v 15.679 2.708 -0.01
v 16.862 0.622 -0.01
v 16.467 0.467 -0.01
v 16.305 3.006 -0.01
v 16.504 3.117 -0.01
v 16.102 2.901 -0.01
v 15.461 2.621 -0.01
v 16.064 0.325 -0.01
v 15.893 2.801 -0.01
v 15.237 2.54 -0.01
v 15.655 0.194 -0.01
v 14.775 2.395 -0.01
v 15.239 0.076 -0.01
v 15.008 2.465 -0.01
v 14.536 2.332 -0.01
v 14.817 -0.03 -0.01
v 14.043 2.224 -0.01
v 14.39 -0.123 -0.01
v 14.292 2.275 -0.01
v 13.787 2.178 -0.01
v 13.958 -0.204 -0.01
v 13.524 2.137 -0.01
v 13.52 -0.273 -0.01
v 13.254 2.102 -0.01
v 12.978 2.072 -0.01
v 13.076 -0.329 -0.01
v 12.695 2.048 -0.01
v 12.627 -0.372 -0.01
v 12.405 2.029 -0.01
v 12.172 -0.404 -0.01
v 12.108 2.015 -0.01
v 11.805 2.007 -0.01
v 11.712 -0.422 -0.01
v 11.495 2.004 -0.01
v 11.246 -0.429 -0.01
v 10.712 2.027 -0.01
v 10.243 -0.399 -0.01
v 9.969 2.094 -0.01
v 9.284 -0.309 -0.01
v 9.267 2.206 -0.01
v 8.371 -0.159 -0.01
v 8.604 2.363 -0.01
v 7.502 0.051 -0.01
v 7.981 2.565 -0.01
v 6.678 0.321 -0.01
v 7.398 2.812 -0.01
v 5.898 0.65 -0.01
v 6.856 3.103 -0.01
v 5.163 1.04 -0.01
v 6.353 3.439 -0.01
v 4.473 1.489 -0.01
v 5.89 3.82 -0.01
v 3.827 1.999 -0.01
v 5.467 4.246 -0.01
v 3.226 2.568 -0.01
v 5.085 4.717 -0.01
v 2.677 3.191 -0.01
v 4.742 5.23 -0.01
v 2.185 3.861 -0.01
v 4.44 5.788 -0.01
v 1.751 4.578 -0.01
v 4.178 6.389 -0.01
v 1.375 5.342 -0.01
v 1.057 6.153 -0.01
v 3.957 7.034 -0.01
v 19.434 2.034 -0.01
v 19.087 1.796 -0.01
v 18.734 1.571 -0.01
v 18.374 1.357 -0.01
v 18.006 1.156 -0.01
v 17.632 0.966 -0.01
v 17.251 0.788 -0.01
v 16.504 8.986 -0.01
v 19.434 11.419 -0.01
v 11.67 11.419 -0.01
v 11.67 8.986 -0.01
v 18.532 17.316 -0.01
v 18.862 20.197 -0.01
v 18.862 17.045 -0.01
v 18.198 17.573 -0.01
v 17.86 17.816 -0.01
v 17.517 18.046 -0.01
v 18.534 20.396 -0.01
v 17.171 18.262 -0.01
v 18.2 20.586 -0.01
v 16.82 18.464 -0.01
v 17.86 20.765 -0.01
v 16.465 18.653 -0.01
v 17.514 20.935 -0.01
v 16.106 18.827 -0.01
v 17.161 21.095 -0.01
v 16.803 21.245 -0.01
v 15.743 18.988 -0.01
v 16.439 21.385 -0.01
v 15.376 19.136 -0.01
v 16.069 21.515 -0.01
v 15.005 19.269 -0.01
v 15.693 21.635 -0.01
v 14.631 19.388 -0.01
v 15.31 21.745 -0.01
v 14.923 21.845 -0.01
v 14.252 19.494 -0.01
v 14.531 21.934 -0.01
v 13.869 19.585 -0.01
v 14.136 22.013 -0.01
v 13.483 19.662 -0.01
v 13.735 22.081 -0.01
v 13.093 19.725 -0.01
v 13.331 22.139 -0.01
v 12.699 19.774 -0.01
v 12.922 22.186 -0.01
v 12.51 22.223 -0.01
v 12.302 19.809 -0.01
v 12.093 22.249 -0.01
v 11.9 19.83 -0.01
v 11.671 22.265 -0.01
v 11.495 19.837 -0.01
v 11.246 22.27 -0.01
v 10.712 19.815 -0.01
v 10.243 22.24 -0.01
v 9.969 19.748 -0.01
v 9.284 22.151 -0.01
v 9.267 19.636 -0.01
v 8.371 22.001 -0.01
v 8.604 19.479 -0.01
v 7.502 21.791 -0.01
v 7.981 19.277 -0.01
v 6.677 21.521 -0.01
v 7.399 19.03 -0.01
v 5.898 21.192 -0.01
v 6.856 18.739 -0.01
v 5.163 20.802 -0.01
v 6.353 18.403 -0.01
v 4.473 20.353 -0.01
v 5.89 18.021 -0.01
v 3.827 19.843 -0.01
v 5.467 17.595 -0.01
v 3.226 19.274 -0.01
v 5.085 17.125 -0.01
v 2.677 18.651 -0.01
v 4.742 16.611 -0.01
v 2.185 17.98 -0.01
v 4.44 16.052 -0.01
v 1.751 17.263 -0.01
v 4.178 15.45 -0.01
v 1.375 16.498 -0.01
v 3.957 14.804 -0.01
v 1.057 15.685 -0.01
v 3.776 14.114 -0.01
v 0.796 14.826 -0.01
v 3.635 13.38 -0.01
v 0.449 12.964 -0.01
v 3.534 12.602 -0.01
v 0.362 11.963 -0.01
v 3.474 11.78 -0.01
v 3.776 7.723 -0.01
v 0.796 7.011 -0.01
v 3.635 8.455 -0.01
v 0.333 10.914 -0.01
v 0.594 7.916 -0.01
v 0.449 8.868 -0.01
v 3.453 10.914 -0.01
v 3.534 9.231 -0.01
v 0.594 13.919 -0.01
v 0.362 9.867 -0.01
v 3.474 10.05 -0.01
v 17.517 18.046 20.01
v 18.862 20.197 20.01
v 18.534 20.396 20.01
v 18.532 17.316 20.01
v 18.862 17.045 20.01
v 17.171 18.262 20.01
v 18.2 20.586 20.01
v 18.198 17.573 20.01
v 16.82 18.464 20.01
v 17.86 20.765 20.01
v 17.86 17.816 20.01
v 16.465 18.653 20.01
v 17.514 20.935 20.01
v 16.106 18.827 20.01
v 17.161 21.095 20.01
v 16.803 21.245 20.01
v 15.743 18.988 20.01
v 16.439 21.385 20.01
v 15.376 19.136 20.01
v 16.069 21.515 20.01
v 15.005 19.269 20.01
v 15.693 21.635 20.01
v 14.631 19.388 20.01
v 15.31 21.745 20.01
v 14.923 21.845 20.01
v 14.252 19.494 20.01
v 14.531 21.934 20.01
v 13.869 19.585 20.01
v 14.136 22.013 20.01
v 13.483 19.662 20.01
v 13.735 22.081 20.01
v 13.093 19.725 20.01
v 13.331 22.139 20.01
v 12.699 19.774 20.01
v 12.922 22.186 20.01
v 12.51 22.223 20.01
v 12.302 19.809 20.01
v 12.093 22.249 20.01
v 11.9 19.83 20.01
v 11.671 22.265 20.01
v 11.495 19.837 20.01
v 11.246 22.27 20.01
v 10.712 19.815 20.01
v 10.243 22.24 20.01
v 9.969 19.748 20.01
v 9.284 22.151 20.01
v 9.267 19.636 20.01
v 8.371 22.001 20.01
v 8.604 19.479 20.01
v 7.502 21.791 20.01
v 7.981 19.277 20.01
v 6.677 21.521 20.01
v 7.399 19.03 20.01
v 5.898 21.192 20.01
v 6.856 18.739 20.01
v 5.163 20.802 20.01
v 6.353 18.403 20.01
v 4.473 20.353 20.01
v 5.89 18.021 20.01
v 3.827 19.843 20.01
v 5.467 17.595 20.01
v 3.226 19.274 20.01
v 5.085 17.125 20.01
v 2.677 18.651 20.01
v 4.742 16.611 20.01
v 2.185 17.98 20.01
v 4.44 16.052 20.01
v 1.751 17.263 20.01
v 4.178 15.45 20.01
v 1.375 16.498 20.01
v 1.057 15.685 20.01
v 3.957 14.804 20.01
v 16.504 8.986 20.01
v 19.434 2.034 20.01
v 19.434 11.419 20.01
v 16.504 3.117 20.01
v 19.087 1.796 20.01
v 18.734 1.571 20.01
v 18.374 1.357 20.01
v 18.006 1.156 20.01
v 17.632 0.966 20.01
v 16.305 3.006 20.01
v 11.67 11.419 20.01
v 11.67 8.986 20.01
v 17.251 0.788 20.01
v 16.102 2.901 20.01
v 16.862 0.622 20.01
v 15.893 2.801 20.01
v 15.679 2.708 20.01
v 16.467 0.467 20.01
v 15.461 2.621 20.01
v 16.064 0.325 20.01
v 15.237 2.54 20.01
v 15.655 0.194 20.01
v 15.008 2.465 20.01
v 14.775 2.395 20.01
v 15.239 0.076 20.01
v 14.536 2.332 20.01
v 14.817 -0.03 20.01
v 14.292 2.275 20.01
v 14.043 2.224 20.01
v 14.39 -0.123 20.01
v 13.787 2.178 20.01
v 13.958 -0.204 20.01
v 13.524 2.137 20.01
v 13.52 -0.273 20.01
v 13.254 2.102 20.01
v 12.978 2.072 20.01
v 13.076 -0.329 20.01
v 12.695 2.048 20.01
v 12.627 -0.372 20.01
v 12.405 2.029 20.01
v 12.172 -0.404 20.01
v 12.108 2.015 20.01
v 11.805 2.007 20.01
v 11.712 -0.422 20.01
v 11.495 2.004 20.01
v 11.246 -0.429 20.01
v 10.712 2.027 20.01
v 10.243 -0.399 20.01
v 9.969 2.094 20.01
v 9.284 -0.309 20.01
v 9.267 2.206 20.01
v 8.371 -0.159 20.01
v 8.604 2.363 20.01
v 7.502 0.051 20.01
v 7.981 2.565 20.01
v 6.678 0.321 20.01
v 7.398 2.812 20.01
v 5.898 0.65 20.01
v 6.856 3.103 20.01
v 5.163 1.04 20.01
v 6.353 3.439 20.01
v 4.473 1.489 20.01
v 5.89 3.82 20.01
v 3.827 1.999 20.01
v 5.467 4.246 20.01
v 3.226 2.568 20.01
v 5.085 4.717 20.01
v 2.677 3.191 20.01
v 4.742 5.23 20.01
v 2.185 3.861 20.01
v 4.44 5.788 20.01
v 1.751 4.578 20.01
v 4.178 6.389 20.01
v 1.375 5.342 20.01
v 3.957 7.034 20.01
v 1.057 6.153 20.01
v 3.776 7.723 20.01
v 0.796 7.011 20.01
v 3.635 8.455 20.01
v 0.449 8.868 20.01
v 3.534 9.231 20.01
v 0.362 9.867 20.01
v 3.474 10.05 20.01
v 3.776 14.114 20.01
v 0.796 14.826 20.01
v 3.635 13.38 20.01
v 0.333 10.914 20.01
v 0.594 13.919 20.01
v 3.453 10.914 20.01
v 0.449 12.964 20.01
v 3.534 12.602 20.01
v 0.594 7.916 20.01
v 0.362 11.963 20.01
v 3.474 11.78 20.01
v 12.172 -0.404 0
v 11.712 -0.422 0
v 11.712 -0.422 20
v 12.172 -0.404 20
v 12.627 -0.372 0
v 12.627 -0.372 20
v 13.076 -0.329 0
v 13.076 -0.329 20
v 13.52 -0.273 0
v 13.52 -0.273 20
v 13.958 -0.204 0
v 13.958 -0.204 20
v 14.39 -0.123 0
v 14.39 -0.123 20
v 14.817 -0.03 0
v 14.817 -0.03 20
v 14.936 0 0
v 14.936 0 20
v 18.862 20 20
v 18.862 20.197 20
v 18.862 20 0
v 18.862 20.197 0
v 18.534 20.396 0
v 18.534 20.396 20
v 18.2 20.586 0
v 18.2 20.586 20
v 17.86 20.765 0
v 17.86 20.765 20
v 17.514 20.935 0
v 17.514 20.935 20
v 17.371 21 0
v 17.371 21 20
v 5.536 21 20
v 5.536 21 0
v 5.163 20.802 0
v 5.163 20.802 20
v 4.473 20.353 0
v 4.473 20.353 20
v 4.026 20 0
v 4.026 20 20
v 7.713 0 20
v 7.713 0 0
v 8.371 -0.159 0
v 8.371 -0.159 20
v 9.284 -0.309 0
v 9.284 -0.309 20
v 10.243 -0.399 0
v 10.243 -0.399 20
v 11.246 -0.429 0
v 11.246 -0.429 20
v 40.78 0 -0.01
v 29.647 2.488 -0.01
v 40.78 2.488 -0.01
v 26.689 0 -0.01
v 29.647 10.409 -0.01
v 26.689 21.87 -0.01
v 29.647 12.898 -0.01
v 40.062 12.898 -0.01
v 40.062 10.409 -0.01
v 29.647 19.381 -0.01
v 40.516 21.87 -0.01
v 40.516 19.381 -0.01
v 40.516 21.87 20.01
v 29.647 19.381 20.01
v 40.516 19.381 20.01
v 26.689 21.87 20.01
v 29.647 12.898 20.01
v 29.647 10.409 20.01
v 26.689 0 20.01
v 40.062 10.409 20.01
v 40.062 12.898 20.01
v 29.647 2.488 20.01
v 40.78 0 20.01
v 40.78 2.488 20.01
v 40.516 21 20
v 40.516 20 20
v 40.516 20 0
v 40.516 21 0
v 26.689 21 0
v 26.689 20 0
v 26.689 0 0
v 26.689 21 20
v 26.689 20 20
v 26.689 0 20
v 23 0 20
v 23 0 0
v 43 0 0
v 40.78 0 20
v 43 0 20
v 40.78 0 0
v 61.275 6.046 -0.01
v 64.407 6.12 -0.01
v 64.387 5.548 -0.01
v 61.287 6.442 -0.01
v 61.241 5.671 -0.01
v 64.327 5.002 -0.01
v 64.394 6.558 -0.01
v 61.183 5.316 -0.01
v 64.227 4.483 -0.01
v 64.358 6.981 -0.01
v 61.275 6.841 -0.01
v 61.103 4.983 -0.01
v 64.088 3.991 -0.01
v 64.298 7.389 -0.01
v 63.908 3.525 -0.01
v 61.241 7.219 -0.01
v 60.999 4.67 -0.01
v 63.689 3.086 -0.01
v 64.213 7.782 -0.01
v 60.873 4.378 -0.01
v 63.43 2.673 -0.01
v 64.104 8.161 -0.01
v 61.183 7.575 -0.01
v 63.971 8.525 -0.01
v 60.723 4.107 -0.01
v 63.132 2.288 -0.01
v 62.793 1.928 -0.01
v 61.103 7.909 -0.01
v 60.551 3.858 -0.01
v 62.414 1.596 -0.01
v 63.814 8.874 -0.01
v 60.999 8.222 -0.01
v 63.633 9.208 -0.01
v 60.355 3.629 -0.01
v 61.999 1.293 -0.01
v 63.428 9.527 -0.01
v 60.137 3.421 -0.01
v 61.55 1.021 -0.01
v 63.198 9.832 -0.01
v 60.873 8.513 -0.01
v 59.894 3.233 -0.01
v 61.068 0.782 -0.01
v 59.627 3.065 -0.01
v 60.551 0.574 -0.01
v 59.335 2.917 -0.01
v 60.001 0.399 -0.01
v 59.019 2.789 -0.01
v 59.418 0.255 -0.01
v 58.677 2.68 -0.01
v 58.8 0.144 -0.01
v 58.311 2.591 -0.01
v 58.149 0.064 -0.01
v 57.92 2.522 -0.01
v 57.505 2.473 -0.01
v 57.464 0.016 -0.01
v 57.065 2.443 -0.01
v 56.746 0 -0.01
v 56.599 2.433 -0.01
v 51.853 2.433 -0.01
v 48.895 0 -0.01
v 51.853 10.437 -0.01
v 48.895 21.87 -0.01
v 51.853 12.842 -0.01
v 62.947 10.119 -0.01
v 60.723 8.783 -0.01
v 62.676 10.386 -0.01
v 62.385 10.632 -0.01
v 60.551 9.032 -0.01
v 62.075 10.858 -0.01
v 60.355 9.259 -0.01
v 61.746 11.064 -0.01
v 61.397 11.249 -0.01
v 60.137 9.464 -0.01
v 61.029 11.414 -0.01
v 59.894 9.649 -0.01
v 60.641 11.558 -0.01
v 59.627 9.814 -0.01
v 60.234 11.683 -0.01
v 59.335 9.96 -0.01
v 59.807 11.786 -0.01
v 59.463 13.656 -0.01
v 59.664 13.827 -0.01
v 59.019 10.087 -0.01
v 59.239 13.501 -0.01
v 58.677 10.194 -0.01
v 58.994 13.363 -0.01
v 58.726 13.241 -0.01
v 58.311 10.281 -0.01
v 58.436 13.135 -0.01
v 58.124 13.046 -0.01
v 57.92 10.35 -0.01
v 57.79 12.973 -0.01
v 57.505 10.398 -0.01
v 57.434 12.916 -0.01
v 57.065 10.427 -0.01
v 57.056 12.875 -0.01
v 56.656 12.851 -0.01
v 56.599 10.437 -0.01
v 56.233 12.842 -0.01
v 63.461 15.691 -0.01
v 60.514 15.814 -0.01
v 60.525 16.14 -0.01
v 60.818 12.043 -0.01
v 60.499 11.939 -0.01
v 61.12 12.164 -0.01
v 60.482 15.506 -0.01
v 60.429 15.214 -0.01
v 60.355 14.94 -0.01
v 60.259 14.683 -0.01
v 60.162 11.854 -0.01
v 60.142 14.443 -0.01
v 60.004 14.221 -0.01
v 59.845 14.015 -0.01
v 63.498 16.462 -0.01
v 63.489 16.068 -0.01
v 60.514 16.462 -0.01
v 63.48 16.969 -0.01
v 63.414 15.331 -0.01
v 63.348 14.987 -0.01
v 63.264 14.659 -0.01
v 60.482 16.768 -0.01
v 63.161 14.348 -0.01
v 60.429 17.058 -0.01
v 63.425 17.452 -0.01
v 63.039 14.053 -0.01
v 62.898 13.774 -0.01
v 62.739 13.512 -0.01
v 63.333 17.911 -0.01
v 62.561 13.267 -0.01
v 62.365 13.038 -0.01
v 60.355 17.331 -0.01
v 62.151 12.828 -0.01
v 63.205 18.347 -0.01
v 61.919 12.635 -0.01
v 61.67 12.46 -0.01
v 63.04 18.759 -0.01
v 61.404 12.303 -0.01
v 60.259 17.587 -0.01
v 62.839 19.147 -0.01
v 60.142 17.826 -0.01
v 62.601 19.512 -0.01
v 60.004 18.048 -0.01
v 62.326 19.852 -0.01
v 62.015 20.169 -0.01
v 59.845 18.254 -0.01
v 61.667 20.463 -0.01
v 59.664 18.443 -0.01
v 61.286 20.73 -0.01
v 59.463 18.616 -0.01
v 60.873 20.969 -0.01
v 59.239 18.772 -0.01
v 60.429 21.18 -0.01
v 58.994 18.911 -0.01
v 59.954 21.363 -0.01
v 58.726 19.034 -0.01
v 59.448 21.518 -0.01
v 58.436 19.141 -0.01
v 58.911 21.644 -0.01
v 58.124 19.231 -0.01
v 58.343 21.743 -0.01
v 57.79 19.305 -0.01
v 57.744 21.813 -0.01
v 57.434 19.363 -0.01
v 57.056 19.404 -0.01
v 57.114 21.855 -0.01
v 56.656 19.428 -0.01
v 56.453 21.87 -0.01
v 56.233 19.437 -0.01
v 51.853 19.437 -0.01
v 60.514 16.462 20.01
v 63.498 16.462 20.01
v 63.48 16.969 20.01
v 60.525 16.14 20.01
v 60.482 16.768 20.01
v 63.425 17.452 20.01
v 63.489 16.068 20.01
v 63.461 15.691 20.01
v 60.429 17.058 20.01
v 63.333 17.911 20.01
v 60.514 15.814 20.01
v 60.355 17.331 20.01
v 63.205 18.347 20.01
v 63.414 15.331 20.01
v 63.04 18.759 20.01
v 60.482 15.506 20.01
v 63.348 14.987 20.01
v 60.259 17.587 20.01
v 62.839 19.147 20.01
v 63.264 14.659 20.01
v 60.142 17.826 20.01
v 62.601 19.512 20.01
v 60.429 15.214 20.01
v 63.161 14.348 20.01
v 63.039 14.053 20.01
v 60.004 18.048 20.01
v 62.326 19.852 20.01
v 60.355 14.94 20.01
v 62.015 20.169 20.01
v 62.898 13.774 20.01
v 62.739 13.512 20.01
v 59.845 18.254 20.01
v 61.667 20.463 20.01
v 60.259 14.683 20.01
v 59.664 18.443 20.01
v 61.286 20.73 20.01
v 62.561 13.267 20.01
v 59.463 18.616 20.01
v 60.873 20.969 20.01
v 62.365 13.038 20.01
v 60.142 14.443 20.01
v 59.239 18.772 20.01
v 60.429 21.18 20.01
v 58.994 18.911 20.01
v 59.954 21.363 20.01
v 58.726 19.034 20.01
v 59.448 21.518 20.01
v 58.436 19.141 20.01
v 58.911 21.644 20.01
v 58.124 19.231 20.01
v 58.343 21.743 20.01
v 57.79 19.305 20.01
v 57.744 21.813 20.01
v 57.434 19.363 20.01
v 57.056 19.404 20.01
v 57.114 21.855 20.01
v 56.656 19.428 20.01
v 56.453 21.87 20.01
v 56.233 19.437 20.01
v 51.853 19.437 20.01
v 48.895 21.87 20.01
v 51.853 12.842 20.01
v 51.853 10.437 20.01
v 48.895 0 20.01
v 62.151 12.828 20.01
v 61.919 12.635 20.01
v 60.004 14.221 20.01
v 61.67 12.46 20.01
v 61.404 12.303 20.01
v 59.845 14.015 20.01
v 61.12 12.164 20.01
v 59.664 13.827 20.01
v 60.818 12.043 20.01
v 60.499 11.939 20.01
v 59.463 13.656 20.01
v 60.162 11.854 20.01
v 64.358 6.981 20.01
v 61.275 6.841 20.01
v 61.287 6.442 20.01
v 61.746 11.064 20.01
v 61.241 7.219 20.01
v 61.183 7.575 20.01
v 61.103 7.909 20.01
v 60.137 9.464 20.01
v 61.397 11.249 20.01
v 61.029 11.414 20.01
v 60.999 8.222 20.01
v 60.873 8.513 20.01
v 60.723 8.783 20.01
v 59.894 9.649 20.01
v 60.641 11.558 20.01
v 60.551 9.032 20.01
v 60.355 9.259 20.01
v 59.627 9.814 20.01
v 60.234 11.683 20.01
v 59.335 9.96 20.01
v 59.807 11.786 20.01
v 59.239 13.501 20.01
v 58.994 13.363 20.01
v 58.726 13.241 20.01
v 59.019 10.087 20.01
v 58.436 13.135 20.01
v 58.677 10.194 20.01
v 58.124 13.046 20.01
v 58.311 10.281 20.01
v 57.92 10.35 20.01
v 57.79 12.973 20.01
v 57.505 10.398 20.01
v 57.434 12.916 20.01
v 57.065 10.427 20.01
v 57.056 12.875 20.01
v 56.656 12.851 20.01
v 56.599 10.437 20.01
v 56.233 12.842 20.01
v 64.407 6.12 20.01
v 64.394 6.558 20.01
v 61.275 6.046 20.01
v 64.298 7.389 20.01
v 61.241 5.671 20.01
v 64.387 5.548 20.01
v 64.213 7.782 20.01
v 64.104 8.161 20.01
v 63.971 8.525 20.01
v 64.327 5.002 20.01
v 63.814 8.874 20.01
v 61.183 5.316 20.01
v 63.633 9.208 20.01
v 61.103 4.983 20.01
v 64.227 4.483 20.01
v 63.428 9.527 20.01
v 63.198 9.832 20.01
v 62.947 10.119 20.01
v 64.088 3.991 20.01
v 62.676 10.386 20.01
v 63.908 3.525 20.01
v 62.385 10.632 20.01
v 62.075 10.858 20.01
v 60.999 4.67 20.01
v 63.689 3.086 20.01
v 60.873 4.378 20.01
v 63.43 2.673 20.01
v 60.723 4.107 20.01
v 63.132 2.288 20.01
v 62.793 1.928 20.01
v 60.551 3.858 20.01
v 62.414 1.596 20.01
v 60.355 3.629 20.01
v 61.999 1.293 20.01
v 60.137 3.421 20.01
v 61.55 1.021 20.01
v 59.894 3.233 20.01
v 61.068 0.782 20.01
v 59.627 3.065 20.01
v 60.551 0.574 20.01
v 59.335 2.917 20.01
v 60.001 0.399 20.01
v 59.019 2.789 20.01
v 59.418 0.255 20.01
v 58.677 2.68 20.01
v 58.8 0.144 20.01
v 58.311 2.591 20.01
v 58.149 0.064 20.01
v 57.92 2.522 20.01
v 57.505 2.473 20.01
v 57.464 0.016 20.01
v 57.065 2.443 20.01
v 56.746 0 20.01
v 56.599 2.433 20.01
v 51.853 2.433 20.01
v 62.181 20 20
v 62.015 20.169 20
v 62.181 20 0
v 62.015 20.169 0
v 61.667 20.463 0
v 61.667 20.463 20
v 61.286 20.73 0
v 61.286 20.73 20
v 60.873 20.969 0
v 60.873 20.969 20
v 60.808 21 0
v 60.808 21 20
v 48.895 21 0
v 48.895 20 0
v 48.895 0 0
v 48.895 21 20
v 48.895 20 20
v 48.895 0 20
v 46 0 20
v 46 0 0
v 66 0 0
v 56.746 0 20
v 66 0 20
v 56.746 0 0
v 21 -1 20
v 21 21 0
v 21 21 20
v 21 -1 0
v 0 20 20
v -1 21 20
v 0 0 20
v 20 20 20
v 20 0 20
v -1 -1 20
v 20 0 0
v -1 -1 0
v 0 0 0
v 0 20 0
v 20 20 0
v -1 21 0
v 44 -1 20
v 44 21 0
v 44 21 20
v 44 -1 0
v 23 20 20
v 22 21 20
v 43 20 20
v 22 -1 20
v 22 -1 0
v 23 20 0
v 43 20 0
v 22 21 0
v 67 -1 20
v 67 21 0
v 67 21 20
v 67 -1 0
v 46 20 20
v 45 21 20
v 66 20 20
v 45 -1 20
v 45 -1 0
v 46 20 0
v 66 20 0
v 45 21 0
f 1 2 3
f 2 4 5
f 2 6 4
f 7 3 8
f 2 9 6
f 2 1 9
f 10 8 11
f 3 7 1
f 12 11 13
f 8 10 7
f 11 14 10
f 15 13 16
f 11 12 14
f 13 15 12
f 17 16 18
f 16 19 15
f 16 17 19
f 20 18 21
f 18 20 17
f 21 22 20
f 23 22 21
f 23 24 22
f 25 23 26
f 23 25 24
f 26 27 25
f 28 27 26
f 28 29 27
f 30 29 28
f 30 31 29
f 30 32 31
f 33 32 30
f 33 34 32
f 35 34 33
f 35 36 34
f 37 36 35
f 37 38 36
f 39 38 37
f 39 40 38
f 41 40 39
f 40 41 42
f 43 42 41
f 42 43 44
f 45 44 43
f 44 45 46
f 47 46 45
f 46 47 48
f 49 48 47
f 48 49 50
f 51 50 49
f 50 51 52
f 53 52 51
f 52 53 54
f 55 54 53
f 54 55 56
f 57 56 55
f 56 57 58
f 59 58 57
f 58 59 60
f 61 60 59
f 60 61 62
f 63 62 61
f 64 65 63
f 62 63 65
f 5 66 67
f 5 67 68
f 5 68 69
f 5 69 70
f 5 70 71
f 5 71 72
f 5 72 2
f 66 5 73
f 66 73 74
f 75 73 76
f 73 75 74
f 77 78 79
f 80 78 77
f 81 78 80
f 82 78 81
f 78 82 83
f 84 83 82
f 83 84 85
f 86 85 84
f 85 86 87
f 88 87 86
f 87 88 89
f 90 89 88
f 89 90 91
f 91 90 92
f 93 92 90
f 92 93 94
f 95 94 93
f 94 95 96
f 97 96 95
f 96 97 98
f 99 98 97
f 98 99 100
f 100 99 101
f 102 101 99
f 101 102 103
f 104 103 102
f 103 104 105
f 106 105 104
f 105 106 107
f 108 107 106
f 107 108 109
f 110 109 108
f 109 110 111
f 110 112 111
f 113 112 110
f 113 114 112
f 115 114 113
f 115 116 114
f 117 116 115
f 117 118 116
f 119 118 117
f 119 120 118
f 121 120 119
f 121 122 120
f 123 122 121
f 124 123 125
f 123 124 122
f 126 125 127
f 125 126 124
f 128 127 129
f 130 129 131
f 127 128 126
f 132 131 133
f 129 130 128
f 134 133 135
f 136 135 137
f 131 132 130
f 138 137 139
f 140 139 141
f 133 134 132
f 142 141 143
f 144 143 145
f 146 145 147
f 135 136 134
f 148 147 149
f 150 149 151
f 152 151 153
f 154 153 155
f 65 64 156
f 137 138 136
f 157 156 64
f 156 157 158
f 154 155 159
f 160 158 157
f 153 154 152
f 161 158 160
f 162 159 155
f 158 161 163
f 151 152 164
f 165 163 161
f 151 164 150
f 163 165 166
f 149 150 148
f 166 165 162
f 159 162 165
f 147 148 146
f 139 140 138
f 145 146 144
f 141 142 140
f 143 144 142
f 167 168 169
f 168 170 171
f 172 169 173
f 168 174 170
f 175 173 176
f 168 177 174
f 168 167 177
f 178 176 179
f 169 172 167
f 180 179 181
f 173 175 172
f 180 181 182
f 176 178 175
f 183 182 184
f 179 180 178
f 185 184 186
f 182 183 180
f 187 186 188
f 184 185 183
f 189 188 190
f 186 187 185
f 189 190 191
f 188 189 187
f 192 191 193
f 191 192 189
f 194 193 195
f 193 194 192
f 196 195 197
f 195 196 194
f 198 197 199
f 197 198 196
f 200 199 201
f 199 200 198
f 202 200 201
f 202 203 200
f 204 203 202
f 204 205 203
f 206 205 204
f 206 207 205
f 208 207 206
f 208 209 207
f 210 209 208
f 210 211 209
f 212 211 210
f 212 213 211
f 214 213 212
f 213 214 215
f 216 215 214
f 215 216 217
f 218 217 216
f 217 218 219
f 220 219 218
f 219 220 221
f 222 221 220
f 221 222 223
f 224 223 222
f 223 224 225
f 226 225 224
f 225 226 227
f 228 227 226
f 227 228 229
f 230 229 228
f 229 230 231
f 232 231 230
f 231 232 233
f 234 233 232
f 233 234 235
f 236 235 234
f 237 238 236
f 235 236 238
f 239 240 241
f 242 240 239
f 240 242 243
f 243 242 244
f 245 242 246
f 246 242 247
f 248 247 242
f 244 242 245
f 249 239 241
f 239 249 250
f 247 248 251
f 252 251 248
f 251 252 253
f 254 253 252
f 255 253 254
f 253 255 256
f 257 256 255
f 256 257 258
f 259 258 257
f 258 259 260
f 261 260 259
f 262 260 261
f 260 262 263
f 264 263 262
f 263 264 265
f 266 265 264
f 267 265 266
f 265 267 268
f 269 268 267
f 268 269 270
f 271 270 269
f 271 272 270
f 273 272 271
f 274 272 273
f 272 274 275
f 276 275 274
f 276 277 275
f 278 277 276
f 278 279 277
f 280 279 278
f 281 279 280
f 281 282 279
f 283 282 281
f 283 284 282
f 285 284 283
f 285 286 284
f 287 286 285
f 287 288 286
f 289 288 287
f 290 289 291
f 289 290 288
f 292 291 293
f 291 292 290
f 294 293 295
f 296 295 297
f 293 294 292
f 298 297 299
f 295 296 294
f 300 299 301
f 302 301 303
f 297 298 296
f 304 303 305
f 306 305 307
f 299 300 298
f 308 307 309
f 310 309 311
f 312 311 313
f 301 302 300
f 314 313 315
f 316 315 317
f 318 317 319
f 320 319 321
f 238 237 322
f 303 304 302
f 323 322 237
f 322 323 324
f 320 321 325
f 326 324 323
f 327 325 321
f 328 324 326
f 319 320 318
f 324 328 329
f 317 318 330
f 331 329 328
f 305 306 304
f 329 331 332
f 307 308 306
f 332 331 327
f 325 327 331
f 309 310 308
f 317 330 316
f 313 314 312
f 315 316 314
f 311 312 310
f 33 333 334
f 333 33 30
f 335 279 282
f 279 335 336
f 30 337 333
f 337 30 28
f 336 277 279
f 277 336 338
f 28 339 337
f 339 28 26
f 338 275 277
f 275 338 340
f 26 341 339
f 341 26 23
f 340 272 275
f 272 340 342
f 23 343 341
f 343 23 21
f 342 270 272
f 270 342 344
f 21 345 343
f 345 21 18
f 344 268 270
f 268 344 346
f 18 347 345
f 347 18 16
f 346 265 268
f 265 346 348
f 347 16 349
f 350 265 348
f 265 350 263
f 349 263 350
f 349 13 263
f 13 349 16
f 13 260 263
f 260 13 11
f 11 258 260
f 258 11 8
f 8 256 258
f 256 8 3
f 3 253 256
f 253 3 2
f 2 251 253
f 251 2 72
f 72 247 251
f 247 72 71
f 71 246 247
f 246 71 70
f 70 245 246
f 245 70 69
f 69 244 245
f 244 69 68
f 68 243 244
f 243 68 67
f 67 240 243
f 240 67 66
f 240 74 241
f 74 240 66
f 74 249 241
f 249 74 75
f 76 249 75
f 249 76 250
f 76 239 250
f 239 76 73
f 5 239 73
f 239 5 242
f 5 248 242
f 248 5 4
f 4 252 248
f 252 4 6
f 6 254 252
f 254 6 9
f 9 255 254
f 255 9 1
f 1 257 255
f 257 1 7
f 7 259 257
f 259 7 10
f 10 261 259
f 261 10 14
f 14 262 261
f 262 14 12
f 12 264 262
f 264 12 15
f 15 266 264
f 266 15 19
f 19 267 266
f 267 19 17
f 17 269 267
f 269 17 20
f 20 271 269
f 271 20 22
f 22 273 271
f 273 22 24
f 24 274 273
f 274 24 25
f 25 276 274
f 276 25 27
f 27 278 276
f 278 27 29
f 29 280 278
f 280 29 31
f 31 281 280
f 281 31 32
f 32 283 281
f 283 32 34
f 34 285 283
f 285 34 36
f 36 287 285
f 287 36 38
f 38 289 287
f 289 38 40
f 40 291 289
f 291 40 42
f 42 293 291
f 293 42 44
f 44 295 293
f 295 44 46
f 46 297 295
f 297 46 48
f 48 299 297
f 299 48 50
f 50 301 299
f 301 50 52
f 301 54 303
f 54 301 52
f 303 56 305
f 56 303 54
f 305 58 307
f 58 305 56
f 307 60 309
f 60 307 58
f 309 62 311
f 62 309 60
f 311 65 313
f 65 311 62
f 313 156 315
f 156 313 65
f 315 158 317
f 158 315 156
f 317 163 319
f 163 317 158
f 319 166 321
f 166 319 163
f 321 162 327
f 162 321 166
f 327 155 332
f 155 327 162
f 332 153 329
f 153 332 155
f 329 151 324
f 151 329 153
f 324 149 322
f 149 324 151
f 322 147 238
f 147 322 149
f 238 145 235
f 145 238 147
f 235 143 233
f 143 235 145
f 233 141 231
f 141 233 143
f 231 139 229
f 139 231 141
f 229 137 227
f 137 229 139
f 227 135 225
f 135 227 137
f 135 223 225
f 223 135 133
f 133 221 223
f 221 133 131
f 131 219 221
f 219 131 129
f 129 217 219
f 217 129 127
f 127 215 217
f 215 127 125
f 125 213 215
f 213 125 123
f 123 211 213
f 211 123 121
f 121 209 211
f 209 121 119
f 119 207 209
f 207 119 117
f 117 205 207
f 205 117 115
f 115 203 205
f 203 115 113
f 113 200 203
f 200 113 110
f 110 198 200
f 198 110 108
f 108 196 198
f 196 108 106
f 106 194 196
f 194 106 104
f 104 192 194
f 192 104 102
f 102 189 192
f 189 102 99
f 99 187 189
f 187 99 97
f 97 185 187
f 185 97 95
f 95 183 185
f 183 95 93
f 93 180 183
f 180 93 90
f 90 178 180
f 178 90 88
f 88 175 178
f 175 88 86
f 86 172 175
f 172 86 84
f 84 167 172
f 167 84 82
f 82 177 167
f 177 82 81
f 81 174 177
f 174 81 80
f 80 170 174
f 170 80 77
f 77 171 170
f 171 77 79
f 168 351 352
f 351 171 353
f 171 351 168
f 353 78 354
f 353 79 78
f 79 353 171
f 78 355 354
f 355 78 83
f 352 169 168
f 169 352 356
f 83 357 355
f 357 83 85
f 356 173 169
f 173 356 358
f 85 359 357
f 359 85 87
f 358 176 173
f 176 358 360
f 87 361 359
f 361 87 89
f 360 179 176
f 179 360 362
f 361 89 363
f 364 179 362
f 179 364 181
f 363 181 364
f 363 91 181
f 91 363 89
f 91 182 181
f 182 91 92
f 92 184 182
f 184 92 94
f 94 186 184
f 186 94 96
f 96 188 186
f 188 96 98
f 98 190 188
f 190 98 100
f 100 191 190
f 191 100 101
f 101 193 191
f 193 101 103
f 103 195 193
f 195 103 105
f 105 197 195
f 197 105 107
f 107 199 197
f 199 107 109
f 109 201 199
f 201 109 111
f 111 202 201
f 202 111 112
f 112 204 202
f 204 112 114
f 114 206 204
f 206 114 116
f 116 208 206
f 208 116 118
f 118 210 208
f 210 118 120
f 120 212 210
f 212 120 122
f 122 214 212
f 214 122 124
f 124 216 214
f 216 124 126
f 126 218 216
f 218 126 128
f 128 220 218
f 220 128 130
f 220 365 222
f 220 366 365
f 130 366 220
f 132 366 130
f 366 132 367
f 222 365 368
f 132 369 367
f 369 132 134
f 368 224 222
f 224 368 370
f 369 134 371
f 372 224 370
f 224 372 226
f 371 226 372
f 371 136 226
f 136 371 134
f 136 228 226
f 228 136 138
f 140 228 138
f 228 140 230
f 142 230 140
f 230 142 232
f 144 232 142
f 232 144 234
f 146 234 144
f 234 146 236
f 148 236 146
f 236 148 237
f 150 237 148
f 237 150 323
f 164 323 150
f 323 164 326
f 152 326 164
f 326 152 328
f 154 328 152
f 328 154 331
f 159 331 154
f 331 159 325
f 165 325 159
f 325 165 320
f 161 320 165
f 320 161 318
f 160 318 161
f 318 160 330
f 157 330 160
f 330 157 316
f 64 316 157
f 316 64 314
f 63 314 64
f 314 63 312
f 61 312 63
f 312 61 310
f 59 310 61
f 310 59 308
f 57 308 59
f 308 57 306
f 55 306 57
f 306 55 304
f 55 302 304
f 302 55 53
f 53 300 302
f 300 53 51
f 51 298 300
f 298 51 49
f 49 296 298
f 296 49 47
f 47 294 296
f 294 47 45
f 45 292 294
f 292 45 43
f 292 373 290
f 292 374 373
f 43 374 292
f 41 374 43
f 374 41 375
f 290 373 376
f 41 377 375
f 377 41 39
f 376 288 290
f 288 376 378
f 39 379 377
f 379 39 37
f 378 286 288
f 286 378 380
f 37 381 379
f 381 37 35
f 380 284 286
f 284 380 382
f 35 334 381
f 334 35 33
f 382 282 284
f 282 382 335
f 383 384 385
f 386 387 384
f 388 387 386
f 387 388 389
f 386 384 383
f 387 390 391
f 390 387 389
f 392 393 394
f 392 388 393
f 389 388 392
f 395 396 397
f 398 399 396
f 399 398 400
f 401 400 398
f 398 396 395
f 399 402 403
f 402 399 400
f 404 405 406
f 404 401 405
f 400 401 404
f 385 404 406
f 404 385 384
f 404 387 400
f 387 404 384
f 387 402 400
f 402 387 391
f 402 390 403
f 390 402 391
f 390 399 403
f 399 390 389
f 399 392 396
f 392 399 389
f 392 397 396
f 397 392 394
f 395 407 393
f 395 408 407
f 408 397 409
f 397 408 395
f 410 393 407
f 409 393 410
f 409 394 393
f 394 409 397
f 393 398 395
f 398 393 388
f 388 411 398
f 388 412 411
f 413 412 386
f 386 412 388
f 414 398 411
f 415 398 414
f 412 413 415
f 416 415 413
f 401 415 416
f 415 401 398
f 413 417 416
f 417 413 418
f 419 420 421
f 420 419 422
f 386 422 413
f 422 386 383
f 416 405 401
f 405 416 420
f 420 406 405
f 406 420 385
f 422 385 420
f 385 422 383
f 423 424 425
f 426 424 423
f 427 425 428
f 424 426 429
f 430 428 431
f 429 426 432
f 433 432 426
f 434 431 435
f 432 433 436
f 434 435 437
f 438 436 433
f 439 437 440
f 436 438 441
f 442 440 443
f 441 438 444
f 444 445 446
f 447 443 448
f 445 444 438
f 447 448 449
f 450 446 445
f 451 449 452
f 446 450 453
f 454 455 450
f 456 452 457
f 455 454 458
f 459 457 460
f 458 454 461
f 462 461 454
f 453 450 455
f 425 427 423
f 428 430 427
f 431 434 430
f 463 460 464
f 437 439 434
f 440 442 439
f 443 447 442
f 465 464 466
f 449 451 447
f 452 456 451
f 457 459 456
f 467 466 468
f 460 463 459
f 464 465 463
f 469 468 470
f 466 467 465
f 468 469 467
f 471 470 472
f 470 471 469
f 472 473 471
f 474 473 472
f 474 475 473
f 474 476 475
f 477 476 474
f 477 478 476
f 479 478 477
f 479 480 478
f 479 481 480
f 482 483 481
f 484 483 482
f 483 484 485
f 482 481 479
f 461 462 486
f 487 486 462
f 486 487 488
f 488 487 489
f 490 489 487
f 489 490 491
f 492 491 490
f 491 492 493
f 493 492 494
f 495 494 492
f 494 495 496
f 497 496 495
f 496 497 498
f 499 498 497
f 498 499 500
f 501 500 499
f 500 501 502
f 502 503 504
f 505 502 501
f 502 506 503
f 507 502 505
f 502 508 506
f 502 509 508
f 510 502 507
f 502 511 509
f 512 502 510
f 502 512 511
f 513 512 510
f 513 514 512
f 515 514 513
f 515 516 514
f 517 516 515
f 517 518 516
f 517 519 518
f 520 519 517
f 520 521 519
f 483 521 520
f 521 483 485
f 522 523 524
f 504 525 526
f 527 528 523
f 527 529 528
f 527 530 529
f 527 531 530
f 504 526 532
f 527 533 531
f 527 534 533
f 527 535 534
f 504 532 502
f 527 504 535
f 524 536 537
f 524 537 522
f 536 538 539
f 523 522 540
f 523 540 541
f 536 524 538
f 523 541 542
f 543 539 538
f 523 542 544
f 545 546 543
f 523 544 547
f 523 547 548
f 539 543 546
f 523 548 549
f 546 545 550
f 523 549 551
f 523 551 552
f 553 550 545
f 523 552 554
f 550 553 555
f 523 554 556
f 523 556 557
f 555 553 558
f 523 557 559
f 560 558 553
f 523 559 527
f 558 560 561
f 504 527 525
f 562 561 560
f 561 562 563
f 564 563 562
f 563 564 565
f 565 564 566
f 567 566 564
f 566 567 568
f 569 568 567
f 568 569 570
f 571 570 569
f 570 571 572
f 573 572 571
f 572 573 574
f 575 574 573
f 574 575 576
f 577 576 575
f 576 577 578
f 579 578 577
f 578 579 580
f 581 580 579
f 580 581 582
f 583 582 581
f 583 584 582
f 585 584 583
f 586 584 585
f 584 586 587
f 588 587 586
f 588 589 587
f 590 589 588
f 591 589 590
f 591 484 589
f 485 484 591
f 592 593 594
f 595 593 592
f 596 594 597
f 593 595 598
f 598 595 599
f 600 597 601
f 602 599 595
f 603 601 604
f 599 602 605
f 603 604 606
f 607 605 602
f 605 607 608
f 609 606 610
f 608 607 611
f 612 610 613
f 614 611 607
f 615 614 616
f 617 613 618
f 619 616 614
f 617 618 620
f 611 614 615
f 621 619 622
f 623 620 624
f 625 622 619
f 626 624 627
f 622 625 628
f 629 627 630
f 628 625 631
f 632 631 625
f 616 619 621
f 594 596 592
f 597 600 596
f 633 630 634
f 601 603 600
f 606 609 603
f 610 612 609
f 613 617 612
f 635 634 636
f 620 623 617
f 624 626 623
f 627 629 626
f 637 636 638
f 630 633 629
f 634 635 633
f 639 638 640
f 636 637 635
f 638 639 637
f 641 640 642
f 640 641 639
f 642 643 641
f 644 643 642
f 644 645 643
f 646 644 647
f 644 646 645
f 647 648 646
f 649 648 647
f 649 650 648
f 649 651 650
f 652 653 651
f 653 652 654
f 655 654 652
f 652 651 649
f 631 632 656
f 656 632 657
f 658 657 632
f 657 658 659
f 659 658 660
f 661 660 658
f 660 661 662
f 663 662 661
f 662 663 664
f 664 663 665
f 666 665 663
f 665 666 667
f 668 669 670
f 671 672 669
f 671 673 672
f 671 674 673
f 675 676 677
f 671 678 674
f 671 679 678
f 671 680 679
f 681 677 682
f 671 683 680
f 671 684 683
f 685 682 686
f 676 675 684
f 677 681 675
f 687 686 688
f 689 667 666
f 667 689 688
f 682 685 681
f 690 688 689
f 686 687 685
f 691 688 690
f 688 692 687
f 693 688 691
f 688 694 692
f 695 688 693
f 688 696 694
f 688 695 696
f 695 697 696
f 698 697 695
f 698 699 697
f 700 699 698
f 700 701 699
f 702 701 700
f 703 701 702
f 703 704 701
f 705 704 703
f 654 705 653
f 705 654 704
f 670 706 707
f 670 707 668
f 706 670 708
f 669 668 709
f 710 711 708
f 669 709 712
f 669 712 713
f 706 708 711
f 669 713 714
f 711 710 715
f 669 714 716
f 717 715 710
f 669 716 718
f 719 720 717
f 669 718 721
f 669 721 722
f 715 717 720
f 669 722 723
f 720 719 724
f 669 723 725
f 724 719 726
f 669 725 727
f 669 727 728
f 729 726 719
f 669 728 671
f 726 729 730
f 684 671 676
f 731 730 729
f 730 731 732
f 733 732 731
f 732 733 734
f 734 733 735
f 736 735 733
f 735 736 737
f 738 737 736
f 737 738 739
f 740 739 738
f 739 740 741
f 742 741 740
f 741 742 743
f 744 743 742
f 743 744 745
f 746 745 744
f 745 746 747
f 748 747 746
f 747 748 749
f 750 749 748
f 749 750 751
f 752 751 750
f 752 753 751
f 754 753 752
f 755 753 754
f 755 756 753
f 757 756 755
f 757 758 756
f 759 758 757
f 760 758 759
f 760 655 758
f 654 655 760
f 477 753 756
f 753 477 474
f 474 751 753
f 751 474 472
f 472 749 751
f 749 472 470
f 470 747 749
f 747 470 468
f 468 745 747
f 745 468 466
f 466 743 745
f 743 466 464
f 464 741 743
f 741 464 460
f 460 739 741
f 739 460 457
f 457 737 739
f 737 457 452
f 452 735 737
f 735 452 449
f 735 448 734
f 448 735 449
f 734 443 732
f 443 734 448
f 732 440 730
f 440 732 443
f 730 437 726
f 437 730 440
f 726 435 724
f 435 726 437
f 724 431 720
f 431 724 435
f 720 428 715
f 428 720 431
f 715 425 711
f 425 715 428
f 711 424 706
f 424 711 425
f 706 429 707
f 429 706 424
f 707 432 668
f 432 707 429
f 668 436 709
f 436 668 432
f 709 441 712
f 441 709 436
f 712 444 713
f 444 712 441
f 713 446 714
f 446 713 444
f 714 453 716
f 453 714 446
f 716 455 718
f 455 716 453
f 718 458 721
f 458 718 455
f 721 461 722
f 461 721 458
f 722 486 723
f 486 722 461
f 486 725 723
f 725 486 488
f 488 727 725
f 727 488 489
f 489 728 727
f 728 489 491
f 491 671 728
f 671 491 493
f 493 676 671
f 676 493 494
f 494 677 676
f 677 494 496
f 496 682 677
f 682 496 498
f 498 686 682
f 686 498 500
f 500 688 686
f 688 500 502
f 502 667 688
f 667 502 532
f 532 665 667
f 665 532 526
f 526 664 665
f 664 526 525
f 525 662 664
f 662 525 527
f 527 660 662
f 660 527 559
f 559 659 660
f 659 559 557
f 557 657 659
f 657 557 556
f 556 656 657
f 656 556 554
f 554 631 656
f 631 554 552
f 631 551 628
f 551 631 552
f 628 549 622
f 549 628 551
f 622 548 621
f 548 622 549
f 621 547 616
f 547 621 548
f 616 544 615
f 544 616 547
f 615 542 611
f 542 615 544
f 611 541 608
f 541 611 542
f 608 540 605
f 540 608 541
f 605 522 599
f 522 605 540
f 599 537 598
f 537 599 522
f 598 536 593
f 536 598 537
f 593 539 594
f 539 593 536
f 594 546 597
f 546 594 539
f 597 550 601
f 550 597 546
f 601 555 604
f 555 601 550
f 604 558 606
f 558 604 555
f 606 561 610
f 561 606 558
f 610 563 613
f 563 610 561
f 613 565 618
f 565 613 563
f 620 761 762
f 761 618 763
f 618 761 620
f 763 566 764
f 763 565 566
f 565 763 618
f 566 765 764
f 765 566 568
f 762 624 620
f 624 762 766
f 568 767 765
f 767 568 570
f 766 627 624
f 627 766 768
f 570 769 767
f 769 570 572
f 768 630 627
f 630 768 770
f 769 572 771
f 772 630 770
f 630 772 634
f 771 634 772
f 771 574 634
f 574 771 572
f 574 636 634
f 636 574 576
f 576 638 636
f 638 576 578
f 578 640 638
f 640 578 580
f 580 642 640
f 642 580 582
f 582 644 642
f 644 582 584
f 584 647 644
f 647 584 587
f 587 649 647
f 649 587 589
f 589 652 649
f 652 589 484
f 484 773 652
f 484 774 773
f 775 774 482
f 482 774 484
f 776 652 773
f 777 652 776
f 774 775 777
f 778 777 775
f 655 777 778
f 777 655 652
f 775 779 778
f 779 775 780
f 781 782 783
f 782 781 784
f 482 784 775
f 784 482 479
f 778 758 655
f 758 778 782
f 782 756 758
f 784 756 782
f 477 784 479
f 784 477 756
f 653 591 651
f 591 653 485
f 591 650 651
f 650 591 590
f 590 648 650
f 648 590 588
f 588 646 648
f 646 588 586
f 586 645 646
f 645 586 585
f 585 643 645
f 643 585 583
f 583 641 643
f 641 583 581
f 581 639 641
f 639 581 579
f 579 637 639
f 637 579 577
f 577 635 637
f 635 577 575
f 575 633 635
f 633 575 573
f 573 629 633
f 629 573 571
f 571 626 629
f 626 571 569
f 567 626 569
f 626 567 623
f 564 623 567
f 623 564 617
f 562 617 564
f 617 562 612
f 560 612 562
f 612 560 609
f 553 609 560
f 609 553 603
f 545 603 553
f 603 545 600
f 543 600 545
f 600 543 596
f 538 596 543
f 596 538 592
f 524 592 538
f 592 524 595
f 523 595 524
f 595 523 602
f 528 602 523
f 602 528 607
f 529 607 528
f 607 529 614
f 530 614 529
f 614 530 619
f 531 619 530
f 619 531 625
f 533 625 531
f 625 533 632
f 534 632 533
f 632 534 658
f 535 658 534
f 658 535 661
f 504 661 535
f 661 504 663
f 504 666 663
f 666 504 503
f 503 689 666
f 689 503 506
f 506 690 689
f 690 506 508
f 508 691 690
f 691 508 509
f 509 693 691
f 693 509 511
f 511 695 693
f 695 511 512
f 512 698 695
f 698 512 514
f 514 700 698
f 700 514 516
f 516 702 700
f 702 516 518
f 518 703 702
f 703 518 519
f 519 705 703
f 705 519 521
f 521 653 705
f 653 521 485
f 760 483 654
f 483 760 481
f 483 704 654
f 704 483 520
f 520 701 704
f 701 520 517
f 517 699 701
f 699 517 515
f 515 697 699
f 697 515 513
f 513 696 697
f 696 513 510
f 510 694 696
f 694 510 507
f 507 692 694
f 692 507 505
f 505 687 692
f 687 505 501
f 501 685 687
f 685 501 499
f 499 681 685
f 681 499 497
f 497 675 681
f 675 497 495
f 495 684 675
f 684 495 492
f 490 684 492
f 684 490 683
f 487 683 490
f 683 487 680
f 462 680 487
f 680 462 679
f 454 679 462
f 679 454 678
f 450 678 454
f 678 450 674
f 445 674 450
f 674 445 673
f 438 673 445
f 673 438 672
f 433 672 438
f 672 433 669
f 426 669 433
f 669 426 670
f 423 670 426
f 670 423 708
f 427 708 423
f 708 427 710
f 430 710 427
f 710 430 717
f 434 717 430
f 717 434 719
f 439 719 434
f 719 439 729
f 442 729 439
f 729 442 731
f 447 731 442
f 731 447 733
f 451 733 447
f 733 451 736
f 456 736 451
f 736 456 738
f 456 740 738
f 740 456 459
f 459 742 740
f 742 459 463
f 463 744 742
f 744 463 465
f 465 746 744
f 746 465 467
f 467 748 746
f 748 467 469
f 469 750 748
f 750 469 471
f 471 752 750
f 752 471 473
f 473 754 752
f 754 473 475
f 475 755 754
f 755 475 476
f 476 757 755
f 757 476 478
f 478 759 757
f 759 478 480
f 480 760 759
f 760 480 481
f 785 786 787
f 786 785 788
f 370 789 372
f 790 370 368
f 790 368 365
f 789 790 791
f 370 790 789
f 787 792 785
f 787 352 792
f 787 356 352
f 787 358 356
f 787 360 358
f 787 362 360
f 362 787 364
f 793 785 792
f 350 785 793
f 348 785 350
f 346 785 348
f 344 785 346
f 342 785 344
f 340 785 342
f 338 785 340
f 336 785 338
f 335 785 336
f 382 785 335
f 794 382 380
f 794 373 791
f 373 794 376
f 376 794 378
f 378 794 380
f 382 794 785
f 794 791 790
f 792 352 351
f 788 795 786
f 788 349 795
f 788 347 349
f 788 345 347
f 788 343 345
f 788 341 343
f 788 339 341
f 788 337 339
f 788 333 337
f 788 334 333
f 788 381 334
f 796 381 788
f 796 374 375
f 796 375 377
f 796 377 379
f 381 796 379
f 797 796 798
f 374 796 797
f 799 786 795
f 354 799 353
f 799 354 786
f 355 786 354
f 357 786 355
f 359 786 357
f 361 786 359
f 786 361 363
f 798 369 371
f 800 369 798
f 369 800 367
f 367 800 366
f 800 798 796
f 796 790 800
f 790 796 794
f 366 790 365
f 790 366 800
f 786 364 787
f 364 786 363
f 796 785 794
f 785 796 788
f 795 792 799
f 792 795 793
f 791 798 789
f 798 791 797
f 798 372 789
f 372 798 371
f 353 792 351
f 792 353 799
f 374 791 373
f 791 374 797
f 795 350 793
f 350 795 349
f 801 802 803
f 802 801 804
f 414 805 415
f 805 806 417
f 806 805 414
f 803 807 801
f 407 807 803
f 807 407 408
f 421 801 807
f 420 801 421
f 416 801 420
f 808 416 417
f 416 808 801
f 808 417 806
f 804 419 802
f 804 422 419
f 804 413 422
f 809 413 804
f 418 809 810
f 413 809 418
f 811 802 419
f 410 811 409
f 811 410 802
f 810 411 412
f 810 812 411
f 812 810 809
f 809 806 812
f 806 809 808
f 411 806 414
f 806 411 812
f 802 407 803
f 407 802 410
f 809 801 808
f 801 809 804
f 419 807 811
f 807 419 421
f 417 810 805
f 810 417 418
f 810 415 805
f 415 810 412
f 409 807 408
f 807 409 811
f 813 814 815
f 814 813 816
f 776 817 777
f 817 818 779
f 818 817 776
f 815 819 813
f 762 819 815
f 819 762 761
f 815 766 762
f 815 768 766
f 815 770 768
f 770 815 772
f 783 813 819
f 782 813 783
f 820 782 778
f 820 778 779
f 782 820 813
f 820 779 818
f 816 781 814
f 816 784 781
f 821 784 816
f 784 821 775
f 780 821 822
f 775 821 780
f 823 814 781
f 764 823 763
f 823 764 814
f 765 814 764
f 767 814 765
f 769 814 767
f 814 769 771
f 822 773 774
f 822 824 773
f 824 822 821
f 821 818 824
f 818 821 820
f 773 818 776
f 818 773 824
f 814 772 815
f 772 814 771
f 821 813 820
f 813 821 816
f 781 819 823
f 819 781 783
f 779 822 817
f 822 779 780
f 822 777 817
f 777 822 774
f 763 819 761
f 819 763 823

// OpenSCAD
// -*- mode: SCAD ; c-file-style: "ellemtel" ; coding: utf-8 -*-
//
// The GEB cube from the cover of Gödel, Escher, Bach.
// Or any other three characrter combination in the same style. EGB works, many others not.
//
// © 2018–2019 Roland Sieker <ospalh@gmail.com>
// Licence: CC-BY-SA 4.0

/* [Global] */

// The part to create.
part = "square_test"; // [tlc: three letter cube,  square_test: squareness test]

// Set this to “render” and click on “Create Thing” when done with the setup.
preview = 1; // [0:render, 1:preview]

/* [Text] */

// Letter One. Make sure the letters fill up most of the square. Otherwise it will not work.
letter_1 = "G";

// Letter Two. Use square_test and tweak to fill the quares
letter_2 = "E";

// Letter Three. Also make sure the characters are in one piece. Otherwise the end result will fall apart
letter_3 = "B";

/* [Size and typeface] */

// Size, but rescaling should work
size = 20; // [5:1:100]

// Typeface. There is a list somewhere which ones work online, or download and use one you have on your computer.
type = "Praxis Next Dan:style=Black";

/* [Tweaks] */

// Scale letter 1 horizontally
l1_x_tweak = 1.08;  // [0.25:0.01:4]
// Scale letter 1 vertically
l1_y_tweak = 1.08;  // [0.25:0.01:4]

// Shift letter 1 horizontally
l1_x_offset = 0;  // [-10:0.01:10]
// Shift letter 1 vertically
l1_y_offset = 0;  // [-10:0.01:10]




// Scale letter 2 horizontally
l2_x_tweak = 1.08;  // [0.25:0.01:4]
// Scale letter 2 vertically
l2_y_tweak = 1.08;  // [0.25:0.01:4]

// Shift letter 2 horizontally
l2_x_offset = 0;  // [-10:0.01:10]
// Shift letter 1 vertically
l2_y_offset = 0;  // [-10:0.01:10]

// Scale letter 3 horizontally
l3_x_tweak = 1.08; // [0.25:0.01:4]
// Scale letter 3 vertically
l3_y_tweak = 1.08;  // [0.25:0.01:4]

// Shift letter 3 horizontally
l3_x_offset = 0;  // [-10:0.01:10]
// Shift letter 1 vertically
l3_y_offset = 0;  // [-10:0.01:10]

/* [Hidden] */

// Done with the customizer

// *******************************************************
// Extra parameters. These can be changed reasonably safely.


w = 1.8;  // Wall width
p = 1.2;  // Bottom, top plate hight
c = 0.4;  // Clearance
angle = 60; // Overhangs much below 60° are a problem for me

// *******************************************************
// Some shortcuts. These shouldn’t be changed


tau = 2 * PI;  // π is still wrong. τ = circumference / r


some_distance = 50;
ms = 0.01;  // Muggeseggele.

// fn for differently sized objects and fs, fa; all for preview or rendering.
pna = 40;
pnb = 15;
pa = 5;
ps = 1;
rna = 180;
rnb = 30;
ra = 2;
rs = 0.25;
function na() = (preview) ? pna : rna;
function nb() = (preview) ? pnb : rnb;
$fs = (preview) ? ps : rs;
$fa = (preview) ? pa : ra;

// *******************************************************
// End setup



// *******************************************************
// Generate the parts

print_part();




module print_part()
{
   if (part == "tlc")
   {
      twc(letter_1, letter_2, letter_3);
   }
   else
   {
      square_test();
   }
}


// *******************************************************
// Code for the parts themselves


module twc(l1, l2, l3)
{
   intersection()
   {
      translate([0, size/2, 0])
         rotate([90,0,90])
         onel(l1, l1_x_tweak, l1_y_tweak, l1_x_offset, l1_y_offset);
      translate([size/2, size, 0])
         rotate([90,0,0])
         onel(l2, l2_x_tweak, l2_y_tweak, l2_x_offset, l2_y_offset);
      translate([size/2,0,0])
         onel(l3, l3_x_tweak, l3_y_tweak, l3_x_offset, l3_y_offset);
   }
}


module onel(tl, xtw, ytw, xoff, yoff)
{
   translate([xoff,yoff,-ms])
      scale([xtw, ytw, 1])
      linear_extrude(size+2*ms)
      text(text=tl, size=size, font=type, halign="center");

}


module square_test()
{

   color("green")
      {
         translate([size/2,0,0])
         {
         onel(letter_1, l1_x_tweak, l1_y_tweak, l1_x_offset, l1_y_offset);
         translate([1.15*size, 0, 0])
            onel(letter_2, l2_x_tweak, l2_y_tweak, l2_x_offset, l2_y_offset);
         translate([2.3*size, 0, 0])
            onel(letter_3, l3_x_tweak, l3_y_tweak, l3_x_offset, l3_y_offset);
         }
      }
   color("red")
   {
      tframe();
      translate([1.15*size, 0, 0])
         tframe();
      translate([2.3*size, 0, 0])
         tframe();
   }
}

module tframe()
{
   translate([-1, -1, 0])
   difference(){
      cube([size+2, size+2, size]);
      translate([1,1, -ms])
         cube([size, size, size+2*ms]);
      }
}
